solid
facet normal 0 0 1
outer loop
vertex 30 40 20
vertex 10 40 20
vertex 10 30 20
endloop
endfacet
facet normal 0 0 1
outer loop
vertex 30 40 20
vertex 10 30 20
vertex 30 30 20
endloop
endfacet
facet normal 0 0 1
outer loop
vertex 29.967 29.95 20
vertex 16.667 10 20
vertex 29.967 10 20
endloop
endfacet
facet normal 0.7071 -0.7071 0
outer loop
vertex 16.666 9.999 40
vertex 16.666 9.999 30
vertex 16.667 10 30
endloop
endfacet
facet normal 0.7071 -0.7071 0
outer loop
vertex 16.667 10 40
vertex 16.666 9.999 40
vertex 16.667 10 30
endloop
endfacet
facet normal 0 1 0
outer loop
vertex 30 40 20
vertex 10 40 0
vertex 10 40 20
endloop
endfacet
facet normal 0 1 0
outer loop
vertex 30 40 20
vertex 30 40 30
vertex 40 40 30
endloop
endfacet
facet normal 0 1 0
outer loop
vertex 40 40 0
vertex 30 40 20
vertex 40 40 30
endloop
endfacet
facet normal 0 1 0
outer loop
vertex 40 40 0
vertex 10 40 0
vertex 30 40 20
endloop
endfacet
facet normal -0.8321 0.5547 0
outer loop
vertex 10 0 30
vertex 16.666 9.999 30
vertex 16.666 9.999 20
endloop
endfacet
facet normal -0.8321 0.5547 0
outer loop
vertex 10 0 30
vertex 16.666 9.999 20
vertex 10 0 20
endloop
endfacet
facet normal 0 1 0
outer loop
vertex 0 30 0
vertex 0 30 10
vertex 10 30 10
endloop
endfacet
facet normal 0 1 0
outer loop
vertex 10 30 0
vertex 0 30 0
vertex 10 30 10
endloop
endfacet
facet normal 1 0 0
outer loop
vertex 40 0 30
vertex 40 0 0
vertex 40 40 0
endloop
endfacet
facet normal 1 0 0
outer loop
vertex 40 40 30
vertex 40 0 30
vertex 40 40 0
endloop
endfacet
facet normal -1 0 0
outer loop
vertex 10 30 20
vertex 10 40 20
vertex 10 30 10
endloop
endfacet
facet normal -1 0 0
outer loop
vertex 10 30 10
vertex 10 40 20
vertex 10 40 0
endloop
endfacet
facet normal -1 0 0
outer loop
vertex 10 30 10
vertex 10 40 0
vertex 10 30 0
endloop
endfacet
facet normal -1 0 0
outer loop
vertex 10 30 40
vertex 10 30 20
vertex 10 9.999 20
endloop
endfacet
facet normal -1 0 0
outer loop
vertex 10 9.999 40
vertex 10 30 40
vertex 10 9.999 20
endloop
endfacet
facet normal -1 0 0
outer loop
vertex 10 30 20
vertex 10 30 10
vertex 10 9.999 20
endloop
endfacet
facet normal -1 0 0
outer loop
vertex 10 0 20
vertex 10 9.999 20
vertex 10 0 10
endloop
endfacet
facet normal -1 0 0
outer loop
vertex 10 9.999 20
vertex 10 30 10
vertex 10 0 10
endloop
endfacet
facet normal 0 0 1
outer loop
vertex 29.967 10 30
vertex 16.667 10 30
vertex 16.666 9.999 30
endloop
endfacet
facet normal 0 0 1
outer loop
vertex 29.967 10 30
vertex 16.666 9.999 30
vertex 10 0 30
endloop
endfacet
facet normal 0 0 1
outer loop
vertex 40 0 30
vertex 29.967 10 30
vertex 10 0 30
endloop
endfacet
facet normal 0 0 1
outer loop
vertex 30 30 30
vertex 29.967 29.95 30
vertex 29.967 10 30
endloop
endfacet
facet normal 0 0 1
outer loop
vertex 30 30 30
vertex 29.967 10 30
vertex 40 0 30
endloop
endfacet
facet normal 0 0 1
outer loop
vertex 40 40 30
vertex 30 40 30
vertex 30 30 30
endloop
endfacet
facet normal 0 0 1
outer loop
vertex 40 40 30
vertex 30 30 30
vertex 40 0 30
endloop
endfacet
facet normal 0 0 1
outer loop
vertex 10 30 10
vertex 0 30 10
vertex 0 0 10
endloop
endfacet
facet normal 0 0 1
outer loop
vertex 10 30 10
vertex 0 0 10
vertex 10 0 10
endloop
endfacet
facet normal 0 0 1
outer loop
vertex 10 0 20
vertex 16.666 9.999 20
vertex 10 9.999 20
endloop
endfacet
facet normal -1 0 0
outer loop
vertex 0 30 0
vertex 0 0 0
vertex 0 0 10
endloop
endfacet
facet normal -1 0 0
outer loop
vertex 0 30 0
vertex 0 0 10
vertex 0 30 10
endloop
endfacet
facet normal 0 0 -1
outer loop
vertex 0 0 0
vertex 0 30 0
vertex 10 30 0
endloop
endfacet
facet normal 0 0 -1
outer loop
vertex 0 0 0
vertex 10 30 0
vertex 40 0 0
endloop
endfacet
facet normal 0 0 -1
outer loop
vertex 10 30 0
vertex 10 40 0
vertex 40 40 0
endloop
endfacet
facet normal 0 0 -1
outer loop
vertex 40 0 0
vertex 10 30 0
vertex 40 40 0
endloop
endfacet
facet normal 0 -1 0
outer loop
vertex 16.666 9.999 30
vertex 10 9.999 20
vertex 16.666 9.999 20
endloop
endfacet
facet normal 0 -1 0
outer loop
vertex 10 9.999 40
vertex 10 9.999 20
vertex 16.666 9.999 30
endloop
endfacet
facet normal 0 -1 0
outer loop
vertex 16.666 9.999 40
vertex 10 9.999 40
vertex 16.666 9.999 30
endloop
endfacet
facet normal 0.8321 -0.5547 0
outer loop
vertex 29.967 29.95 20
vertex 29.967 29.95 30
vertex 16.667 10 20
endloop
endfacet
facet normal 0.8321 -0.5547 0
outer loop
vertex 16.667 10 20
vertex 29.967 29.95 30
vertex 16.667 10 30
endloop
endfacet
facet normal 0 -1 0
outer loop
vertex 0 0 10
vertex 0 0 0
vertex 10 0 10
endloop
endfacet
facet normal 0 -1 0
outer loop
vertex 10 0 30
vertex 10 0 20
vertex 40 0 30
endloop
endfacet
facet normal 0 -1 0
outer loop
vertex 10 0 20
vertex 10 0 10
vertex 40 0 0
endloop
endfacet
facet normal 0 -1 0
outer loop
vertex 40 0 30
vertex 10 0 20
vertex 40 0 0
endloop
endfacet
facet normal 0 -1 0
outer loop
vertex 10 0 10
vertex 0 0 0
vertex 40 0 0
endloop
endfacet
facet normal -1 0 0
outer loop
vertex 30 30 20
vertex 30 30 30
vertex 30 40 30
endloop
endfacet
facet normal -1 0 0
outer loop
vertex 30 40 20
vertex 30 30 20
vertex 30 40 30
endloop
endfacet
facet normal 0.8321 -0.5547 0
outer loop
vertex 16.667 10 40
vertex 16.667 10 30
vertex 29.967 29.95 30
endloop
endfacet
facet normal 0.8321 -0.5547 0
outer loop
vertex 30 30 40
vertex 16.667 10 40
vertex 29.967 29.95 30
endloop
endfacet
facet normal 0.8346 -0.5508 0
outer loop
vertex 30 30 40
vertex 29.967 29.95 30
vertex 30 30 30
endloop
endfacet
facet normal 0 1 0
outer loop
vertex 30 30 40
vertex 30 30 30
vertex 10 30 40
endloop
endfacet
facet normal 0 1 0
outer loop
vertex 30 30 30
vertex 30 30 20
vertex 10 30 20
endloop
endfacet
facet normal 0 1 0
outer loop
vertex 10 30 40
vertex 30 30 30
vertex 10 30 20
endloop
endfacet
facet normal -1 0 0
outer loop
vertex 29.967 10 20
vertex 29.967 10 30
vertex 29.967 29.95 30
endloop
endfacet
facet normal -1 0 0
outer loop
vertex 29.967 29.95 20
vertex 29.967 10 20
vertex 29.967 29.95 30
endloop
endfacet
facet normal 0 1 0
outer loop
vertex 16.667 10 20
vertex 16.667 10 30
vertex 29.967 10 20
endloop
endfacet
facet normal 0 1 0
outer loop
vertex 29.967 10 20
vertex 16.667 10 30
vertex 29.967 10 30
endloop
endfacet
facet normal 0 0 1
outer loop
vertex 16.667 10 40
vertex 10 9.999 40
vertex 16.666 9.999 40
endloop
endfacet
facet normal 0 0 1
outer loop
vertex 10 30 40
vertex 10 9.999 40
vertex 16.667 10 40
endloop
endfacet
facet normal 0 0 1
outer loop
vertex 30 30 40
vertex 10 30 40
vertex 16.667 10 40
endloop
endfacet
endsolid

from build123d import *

# Parameters (mm, degrees)
SKETCH1_W            = 40
SKETCH1_H            = 40
BOSS_EXTRUDE1_DEPTH  = 40
SKETCH2_W            = 10
SKETCH2_H            = 10
CUT_EXTRUDE1_DEPTH   = 40
SKETCH4_W            = 10
SKETCH4_H            = 10
SKETCH4_H_2          = 30
CUT_EXTRUDE2_DEPTH   = 40
SKETCH5_W            = 20
SKETCH5_H            = 10
CUT_EXTRUDE3_DEPTH   = 10
SKETCH7_W            = 20
SKETCH7_H            = 10
CUT_EXTRUDE16_DEPTH  = 20
SKETCH11_W           = 20
SKETCH11_H           = 20
CUT_EXTRUDE19_DEPTH  = 10
CUT_EXTRUDE20_DEPTH  = 10
SKETCH13_W           = 20
SKETCH13_H           = 10
CUT_EXTRUDE21_DEPTH  = 10
BOSS_EXTRUDE2_DEPTH  = 10
SKETCH16_W           = 20
SKETCH16_H           = 20
CUT_EXTRUDE25_DEPTH  = 10
CUT_EXTRUDE26_DEPTH  = 10
SKETCH22_W           = 20
SKETCH22_H           = 10
BOSS_EXTRUDE5_DEPTH  = 10
BOSS_EXTRUDE6_DEPTH  = 10
SKETCH24_W           = 20
SKETCH24_H           = 20
BOSS_EXTRUDE7_DEPTH  = 10
BOSS_EXTRUDE8_DEPTH  = 10
BOSS_EXTRUDE9_DEPTH  = 10
CUT_EXTRUDE27_DEPTH  = 10
BOSS_EXTRUDE12_DEPTH = 10
CUT_EXTRUDE30_DEPTH  = 20
CUT_EXTRUDE31_DEPTH  = 10
SKETCH32_W           = 10
SKETCH32_H           = 19.95
CUT_EXTRUDE36_DEPTH  = 10
SKETCH33_W           = 0.033333333
SKETCH33_H           = 10
CUT_EXTRUDE37_DEPTH  = 10
BOSS_EXTRUDE13_DEPTH = 10
CUT_EXTRUDE40_DEPTH  = 20


with BuildPart() as part:
    # Sketch1 → Boss-Extrude1 (new body)
    with BuildSketch(Plane.XY):
        with Locations((20, 20)):
            Rectangle(SKETCH1_W, SKETCH1_H)
    extrude(amount=BOSS_EXTRUDE1_DEPTH)

    # Sketch2 → Cut-Extrude1 (cut)
    with BuildSketch(Plane.XY.offset(40)):
        with Locations((5, 35)):
            Rectangle(SKETCH2_W, SKETCH2_H)
    extrude(amount=-CUT_EXTRUDE1_DEPTH, mode=Mode.SUBTRACT)

    # Sketch4 → Cut-Extrude2 (cut)
    with BuildSketch(Plane(origin=(0, 40, 0), x_dir=(1, 0, 0), z_dir=(0, 1, 0))):
        with Locations((35, -35)):
            Rectangle(SKETCH4_W, SKETCH4_H)
        with Locations((5, -25)):
            Rectangle(SKETCH4_W, SKETCH4_H_2)
    extrude(amount=-CUT_EXTRUDE2_DEPTH, mode=Mode.SUBTRACT)

    # Sketch5 → Cut-Extrude3 (cut)
    with BuildSketch(Plane.XY.offset(40)):
        with Locations((20, 5)):
            Rectangle(SKETCH5_W, SKETCH5_H)
    extrude(amount=-CUT_EXTRUDE3_DEPTH, mode=Mode.SUBTRACT)

    # Sketch7 → Cut-Extrude16 (cut)
    with BuildSketch(Plane.XY.offset(40)):
        with Locations((20, 35)):
            Rectangle(SKETCH7_W, SKETCH7_H)
    extrude(amount=-CUT_EXTRUDE16_DEPTH, mode=Mode.SUBTRACT)

    # Sketch11 → Cut-Extrude19 (cut)
    with BuildSketch(Plane.XY.offset(40)):
        with Locations((20, 20)):
            Rectangle(SKETCH11_W, SKETCH11_H)
    extrude(amount=-CUT_EXTRUDE19_DEPTH, mode=Mode.SUBTRACT)

    # Sketch12 → Cut-Extrude20 (cut)
    with BuildSketch(Plane(origin=(0, 0, 0), x_dir=(-1, 0, 0), z_dir=(0, 0, -1))):
        Polygon((-10, 30), (-40, 40), (-10, 40), align=None)
    extrude(amount=-CUT_EXTRUDE20_DEPTH, mode=Mode.SUBTRACT)

    # Sketch13 → Cut-Extrude21 (cut)
    with BuildSketch(Plane.XY.offset(20)):
        with Locations((20, 35)):
            Rectangle(SKETCH13_W, SKETCH13_H)
    extrude(amount=-CUT_EXTRUDE21_DEPTH, mode=Mode.SUBTRACT)

    # Sketch15 → Boss-Extrude2 (add)
    with BuildSketch(Plane(origin=(0, 0, 0), x_dir=(-1, 0, 0), z_dir=(0, 0, -1))):
        Polygon((-40, 40), (-10, 40), (-10, 30), align=None)
    extrude(amount=-BOSS_EXTRUDE2_DEPTH)

    # Sketch16 → Cut-Extrude25 (cut)
    with BuildSketch(Plane.XY.offset(30)):
        with Locations((20, 20)):
            Rectangle(SKETCH16_W, SKETCH16_H)
    extrude(amount=-CUT_EXTRUDE25_DEPTH, mode=Mode.SUBTRACT)

    # Sketch19 → Cut-Extrude26 (cut)
    with BuildSketch(Plane.XY.offset(30)):
        Polygon((10, 0), (30, 30), (10, 30), align=None)
    extrude(amount=-CUT_EXTRUDE26_DEPTH, mode=Mode.SUBTRACT)

    # Sketch22 → Boss-Extrude5 (add)
    with BuildSketch(Plane.XY.offset(10)):
        with Locations((20, 35)):
            Rectangle(SKETCH22_W, SKETCH22_H)
    extrude(amount=BOSS_EXTRUDE5_DEPTH)

    # Sketch23 → Boss-Extrude6 (add)
    with BuildSketch(Plane.XY.offset(20)):
        Polygon((16.666666667, 10), (10, 10), (10, 0), align=None)
    extrude(amount=BOSS_EXTRUDE6_DEPTH)

    # Sketch24 → Boss-Extrude7 (add)
    with BuildSketch(Plane.XY.offset(20)):
        with Locations((20, 20)):
            Rectangle(SKETCH24_W, SKETCH24_H)
    extrude(amount=BOSS_EXTRUDE7_DEPTH)

    # Sketch25 → Boss-Extrude8 (add)
    with BuildSketch(Plane.XY.offset(30)):
        Polygon((10, 0), (30, 30), (10, 30), align=None)
    extrude(amount=BOSS_EXTRUDE8_DEPTH)

    # Sketch26 → Boss-Extrude9 (add)
    with BuildSketch(Plane.XY.offset(30)):
        Polygon((30, 30), (30, 10), (16.666666667, 10), align=None)
    extrude(amount=BOSS_EXTRUDE9_DEPTH)

    # Sketch27 → Cut-Extrude27 (cut)
    with BuildSketch(Plane.XY.offset(40)):
        Polygon((10, 0), (30, 30), (10, 30), align=None)
    extrude(amount=-CUT_EXTRUDE27_DEPTH, mode=Mode.SUBTRACT)

    # Sketch28 → Boss-Extrude12 (add)
    with BuildSketch(Plane.XY.offset(30)):
        Polygon((10, 10), (16.666666667, 10), (30, 30), (10, 30), align=None)
        Polygon((10, 0), (16.666666667, 10), (10, 10), align=None)
    extrude(amount=BOSS_EXTRUDE12_DEPTH)

    # Sketch29 → Cut-Extrude30 (cut)
    with BuildSketch(Plane.XY.offset(40)):
        Polygon((29.966666667, 29.95), (16.666666667, 10), (29.966666667, 10), align=None)
    extrude(amount=-CUT_EXTRUDE30_DEPTH, mode=Mode.SUBTRACT)

    # Sketch30 → Cut-Extrude31 (cut)
    with BuildSketch(Plane.XY.offset(40)):
        Polygon((30, 30), (10, 30), (10, 10), (16.666666667, 10), align=None)
    extrude(amount=-CUT_EXTRUDE31_DEPTH, mode=Mode.SUBTRACT)

    # Sketch32 → Cut-Extrude36 (cut)
    with BuildSketch(Plane.ZY.offset(-29.966666667)):
        with Locations((35, 19.975)):
            Rectangle(SKETCH32_W, SKETCH32_H)
    extrude(amount=-CUT_EXTRUDE36_DEPTH, mode=Mode.SUBTRACT)

    # Sketch33 → Cut-Extrude37 (cut)
    with BuildSketch(Plane.XZ.offset(-29.95)):
        with Locations((29.983333334, 35)):
            Rectangle(SKETCH33_W, SKETCH33_H)
    extrude(amount=-CUT_EXTRUDE37_DEPTH, mode=Mode.SUBTRACT)

    # Sketch34 → Boss-Extrude13 (add)
    with BuildSketch(Plane.XY.offset(30)):
        Polygon((10, 10), (16.666666667, 10), (30, 30), (10, 30), align=None)
    extrude(amount=BOSS_EXTRUDE13_DEPTH)

    # Sketch35 → Cut-Extrude40 (cut)
    with BuildSketch(Plane.XY.offset(40)):
        Polygon((10, 0), (10, 9.999), (16.666, 9.999), align=None)
    extrude(amount=-CUT_EXTRUDE40_DEPTH, mode=Mode.SUBTRACT)


solid = part.part
